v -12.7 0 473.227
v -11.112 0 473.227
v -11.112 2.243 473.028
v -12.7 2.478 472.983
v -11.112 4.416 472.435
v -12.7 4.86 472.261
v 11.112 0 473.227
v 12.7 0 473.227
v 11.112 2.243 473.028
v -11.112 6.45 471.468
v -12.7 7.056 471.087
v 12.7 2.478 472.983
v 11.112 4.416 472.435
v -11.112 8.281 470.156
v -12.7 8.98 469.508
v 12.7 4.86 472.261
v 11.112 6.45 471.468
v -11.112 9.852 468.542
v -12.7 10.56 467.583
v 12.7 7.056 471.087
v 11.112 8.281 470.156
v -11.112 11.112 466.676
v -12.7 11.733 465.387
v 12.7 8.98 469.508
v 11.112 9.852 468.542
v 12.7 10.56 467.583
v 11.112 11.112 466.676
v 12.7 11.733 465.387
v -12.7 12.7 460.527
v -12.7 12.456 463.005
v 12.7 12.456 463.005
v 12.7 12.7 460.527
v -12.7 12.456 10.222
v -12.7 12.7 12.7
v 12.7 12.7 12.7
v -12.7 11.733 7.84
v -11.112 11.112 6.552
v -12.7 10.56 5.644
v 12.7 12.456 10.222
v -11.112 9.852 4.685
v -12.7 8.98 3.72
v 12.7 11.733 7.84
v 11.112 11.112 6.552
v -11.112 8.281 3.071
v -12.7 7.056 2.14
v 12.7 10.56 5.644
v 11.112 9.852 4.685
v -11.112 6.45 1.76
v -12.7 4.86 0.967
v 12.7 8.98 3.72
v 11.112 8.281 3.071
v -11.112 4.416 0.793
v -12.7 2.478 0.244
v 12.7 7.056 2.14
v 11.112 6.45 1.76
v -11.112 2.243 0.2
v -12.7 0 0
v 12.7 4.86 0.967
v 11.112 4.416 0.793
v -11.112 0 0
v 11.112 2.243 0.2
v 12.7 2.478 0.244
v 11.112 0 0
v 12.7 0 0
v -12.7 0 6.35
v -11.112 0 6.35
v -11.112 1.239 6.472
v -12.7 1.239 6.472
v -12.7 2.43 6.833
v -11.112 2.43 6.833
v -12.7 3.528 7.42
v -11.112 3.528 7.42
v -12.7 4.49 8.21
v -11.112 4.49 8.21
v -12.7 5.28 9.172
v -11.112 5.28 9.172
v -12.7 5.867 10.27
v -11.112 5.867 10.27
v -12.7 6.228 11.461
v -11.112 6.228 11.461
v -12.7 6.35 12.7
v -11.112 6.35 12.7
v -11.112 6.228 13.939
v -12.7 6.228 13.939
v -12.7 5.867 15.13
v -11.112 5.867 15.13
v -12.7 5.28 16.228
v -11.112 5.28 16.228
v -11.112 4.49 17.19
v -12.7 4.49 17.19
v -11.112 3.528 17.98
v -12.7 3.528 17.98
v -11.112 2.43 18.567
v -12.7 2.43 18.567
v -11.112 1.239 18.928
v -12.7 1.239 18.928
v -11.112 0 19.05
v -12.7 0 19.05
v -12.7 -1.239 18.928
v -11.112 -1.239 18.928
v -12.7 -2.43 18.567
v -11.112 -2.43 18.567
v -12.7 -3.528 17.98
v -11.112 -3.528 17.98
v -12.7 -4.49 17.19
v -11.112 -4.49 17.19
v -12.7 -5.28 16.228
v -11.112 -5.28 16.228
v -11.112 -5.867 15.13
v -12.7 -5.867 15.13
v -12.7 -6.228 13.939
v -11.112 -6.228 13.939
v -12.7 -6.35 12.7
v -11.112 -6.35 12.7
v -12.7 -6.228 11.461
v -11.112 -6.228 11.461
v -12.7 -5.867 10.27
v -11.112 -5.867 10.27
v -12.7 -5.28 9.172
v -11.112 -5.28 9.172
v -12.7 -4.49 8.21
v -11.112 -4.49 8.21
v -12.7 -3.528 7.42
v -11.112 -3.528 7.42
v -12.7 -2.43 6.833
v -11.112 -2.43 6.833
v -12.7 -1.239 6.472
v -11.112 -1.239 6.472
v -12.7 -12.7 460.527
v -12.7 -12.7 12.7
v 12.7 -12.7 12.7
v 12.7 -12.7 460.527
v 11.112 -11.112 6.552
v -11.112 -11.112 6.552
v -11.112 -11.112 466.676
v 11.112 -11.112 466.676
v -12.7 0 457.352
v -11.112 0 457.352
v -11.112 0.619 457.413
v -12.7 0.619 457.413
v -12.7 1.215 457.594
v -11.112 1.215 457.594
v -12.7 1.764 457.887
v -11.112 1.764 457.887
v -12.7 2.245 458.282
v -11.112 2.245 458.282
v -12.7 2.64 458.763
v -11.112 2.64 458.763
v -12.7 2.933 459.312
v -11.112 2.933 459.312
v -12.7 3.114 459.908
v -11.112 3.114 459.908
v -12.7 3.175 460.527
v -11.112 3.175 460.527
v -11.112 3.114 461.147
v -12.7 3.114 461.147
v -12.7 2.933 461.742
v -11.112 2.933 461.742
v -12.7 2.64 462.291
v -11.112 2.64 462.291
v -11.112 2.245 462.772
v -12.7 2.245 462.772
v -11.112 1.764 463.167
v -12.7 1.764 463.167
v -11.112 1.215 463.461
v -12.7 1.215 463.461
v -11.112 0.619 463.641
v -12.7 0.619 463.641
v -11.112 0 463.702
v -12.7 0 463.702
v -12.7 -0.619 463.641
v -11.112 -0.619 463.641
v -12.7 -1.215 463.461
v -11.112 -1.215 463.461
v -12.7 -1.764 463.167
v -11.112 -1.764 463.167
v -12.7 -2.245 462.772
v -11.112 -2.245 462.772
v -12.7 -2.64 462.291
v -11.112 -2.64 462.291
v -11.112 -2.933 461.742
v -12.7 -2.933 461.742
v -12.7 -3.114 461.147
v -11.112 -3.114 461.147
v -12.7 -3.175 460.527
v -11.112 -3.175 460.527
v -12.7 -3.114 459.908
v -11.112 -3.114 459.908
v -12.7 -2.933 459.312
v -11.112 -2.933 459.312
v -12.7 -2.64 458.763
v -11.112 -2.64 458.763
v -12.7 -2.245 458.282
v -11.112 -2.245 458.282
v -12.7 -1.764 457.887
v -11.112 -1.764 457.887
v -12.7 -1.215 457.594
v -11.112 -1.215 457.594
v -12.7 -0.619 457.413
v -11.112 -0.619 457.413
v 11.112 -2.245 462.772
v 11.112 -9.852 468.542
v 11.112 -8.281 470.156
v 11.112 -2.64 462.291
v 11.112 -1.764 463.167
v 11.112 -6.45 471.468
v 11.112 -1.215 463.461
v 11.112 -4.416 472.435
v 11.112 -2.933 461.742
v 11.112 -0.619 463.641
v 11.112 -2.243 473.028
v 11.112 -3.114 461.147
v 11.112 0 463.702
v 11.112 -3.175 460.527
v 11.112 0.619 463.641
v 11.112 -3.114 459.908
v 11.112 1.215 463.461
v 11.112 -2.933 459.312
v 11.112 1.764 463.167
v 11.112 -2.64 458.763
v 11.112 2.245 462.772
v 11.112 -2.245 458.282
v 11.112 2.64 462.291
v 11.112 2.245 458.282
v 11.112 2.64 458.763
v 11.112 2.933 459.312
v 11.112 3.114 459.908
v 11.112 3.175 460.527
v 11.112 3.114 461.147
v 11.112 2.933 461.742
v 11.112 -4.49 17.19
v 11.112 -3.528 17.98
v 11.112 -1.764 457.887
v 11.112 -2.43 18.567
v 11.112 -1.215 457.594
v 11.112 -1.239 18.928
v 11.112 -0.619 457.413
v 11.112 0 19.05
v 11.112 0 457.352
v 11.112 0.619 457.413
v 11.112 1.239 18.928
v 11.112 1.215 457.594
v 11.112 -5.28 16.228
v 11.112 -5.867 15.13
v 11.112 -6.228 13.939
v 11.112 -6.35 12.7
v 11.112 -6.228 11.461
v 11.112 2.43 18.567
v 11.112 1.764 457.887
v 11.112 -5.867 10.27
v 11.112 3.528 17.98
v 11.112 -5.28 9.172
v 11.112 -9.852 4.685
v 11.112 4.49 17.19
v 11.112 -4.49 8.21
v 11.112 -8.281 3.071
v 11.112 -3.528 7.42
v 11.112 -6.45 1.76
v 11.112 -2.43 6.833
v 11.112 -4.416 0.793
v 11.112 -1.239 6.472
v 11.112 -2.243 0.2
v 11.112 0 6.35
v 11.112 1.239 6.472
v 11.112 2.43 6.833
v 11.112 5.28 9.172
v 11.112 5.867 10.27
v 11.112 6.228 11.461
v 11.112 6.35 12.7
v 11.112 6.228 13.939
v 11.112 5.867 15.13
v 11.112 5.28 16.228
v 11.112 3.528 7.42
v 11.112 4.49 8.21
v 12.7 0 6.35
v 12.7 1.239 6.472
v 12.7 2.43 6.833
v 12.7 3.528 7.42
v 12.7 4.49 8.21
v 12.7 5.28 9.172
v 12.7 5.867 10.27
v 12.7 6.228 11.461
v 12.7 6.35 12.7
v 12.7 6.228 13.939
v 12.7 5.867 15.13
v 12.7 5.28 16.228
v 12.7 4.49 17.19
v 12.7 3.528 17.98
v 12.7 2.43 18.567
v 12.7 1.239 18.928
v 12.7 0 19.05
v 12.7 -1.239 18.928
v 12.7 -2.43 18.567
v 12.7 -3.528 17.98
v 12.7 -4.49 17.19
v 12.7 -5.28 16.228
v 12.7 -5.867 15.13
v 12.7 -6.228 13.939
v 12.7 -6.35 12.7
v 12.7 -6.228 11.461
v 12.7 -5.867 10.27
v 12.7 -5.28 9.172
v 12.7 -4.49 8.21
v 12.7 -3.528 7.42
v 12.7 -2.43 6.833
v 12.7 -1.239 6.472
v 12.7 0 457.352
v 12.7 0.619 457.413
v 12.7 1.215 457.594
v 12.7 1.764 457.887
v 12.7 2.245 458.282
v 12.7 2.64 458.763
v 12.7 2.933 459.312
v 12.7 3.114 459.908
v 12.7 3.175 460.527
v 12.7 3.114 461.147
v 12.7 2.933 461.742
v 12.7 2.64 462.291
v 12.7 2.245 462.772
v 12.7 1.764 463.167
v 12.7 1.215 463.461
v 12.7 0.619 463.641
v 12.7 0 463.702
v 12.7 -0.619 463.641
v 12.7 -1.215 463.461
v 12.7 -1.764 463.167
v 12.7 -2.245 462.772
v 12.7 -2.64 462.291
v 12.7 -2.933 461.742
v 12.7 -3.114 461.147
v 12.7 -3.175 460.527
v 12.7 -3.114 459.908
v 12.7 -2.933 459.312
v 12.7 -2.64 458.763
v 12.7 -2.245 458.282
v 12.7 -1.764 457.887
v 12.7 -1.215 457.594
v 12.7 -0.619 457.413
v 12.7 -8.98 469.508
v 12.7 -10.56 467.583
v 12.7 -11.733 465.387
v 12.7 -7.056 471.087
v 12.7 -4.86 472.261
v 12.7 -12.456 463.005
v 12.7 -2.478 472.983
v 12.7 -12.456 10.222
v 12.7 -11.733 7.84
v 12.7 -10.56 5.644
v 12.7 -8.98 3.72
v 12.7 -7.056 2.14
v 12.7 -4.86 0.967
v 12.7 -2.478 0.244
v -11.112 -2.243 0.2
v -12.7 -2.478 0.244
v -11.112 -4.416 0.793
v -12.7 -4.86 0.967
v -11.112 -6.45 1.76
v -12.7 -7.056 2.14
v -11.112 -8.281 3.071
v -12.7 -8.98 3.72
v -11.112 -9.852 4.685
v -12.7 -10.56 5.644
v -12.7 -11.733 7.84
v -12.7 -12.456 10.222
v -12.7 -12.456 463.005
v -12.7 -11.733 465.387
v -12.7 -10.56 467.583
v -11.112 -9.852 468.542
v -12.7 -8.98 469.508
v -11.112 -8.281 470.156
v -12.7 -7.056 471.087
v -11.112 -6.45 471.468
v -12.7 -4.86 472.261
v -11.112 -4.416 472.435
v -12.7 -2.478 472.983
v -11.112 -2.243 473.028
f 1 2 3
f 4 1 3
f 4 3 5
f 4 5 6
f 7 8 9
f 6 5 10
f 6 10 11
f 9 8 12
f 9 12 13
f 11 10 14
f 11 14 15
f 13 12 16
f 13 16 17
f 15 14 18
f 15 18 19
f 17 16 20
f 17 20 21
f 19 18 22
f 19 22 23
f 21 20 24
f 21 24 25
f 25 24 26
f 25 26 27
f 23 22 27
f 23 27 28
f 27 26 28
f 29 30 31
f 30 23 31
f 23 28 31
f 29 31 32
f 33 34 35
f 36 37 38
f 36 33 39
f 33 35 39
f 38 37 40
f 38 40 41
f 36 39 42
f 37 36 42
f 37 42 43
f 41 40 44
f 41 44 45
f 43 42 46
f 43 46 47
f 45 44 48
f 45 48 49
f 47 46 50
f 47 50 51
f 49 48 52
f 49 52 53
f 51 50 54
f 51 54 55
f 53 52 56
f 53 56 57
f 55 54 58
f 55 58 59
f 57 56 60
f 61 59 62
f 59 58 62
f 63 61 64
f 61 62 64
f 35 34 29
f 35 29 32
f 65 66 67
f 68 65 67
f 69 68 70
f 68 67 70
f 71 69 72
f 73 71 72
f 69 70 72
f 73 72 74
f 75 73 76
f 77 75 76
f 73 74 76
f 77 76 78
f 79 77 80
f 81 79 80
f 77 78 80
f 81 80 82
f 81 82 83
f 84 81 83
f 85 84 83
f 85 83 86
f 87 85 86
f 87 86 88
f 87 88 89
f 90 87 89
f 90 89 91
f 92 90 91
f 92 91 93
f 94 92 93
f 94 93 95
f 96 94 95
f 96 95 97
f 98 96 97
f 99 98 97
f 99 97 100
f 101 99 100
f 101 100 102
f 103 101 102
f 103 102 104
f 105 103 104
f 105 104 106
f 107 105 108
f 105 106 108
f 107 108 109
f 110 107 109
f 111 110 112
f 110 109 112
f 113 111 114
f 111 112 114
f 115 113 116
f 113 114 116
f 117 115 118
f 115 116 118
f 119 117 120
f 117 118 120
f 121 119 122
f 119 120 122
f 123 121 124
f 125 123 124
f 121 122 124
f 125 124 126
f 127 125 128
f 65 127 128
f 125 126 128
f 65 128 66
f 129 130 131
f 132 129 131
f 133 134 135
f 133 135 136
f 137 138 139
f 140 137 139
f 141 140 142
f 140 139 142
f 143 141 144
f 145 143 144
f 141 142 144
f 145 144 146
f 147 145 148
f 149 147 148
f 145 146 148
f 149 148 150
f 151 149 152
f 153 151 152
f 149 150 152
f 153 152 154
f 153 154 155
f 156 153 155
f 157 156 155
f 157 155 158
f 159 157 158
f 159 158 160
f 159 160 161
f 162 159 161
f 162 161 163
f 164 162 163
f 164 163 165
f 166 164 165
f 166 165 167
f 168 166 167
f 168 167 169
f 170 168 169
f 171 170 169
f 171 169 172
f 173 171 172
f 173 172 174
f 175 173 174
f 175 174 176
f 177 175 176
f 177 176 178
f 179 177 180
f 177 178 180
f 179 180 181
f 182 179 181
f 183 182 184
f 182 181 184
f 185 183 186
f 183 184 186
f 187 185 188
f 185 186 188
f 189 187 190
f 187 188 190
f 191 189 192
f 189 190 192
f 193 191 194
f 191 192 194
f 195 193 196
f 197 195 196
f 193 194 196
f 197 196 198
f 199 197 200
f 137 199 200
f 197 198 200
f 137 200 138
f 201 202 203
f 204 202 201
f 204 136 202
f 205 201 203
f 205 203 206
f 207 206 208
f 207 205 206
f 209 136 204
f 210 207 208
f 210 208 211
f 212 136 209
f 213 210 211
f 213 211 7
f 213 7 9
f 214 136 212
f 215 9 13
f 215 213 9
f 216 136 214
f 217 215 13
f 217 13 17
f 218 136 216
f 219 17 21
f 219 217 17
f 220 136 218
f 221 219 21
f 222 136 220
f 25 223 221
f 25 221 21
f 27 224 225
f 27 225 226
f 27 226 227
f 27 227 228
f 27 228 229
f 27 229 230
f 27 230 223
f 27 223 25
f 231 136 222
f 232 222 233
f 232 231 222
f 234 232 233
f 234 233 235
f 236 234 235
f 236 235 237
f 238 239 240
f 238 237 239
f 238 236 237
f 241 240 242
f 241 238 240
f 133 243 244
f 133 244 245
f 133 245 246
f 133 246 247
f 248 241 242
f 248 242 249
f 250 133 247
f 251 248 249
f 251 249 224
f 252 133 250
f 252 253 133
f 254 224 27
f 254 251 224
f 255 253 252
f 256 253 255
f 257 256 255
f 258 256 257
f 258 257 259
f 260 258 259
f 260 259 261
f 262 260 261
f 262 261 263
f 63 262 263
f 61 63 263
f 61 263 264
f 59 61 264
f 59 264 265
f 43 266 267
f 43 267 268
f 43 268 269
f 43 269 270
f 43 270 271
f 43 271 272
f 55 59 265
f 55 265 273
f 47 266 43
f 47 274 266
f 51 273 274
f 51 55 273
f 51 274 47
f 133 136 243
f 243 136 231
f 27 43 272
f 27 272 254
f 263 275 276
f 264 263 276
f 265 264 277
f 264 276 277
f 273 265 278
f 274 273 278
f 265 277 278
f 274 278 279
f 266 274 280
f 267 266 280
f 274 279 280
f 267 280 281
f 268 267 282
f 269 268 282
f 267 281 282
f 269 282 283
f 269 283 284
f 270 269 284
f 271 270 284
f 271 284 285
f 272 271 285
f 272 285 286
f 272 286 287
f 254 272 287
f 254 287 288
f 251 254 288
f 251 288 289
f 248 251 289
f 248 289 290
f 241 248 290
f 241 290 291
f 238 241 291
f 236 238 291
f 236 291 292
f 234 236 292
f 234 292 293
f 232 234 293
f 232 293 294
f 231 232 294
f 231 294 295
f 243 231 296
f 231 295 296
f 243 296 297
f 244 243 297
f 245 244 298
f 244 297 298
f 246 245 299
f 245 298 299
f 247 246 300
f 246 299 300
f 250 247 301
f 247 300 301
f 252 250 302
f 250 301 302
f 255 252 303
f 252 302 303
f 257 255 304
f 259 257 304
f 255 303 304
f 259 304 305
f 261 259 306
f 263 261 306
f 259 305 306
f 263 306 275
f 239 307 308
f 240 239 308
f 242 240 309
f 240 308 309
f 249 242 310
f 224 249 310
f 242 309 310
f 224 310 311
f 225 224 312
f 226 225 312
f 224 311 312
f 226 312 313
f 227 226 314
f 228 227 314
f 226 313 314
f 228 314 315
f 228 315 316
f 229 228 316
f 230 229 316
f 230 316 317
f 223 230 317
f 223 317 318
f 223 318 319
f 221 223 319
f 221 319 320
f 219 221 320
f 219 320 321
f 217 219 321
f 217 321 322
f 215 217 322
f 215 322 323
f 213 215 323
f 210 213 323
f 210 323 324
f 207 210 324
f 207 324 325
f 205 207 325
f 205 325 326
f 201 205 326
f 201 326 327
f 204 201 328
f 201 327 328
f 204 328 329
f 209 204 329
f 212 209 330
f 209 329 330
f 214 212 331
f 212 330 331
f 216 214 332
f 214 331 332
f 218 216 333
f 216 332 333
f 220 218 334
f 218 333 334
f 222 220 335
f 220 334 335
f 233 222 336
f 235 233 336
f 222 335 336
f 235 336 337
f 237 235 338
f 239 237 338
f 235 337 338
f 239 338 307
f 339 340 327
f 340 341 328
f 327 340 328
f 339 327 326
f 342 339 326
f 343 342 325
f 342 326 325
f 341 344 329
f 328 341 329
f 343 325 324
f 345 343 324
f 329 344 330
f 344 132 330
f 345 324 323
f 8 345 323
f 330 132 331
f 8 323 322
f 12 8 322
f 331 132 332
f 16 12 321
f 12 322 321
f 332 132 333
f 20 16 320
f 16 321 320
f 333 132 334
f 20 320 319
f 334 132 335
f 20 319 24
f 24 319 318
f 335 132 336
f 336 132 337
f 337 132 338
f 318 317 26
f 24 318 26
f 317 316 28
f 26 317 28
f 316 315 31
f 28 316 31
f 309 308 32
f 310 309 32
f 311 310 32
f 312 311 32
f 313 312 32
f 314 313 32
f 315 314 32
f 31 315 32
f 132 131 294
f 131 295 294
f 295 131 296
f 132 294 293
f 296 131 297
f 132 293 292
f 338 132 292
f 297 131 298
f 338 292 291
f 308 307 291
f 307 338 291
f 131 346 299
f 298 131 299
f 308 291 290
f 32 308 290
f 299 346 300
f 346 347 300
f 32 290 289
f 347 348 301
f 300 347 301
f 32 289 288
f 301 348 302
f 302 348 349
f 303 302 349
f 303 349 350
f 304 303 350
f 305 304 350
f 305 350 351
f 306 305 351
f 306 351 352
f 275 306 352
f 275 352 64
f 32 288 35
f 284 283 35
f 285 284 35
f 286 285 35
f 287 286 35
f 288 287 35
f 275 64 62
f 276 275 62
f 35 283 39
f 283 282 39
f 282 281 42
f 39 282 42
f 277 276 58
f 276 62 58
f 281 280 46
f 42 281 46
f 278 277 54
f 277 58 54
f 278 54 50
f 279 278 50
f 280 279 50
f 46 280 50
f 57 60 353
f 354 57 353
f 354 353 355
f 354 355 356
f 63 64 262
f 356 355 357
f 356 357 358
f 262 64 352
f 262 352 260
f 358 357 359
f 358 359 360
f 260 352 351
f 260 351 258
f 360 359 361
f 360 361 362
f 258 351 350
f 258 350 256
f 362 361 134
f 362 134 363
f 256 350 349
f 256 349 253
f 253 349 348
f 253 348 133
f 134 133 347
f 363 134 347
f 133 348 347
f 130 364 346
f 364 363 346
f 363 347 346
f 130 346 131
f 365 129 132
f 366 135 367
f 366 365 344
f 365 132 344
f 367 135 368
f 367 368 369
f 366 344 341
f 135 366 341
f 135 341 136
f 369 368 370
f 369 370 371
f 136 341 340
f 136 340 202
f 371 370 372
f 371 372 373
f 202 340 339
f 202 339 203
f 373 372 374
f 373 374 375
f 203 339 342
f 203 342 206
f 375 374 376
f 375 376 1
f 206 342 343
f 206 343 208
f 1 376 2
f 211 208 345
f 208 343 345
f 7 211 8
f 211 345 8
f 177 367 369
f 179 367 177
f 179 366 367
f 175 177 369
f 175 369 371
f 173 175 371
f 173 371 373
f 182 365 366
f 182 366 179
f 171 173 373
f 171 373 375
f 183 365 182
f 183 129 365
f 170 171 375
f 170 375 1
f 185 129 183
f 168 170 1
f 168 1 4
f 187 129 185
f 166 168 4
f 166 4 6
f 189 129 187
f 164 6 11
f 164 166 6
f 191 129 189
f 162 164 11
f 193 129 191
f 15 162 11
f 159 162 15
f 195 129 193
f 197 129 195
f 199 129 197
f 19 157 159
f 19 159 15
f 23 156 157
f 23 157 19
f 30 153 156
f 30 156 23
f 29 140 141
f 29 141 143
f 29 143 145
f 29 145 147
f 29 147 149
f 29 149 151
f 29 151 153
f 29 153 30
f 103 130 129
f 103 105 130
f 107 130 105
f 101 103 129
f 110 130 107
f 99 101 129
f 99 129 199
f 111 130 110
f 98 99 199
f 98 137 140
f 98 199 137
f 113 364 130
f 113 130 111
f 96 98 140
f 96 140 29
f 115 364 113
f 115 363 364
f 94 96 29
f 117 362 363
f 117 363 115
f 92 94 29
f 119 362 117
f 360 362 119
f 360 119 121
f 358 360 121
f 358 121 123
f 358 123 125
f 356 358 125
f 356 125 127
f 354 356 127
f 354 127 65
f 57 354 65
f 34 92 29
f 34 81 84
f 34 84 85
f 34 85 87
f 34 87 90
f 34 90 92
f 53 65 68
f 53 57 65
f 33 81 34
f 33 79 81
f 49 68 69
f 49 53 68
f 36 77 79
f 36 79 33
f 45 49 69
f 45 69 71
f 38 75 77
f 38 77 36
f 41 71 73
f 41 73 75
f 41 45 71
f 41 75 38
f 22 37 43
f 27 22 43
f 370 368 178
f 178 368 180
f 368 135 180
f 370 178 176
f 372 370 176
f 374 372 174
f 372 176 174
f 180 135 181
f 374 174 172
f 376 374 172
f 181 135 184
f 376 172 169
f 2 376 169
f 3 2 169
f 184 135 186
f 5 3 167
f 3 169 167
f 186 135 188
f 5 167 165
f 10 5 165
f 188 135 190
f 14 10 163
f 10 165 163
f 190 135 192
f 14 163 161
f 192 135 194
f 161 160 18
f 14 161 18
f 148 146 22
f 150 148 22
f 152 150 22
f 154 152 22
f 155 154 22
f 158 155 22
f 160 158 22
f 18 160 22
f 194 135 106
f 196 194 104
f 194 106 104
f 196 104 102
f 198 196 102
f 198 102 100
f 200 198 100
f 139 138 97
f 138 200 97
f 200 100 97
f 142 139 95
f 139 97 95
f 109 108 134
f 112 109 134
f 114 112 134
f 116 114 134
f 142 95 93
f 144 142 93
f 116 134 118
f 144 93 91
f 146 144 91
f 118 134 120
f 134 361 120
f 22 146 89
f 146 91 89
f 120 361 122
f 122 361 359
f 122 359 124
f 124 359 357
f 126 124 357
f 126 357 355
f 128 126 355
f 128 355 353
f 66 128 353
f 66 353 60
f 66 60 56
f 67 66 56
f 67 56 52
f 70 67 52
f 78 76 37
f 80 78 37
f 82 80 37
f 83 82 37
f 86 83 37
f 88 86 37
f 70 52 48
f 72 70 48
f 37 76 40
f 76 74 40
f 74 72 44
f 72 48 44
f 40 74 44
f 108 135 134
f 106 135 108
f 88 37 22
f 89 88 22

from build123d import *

# Parameters (mm, degrees)
SKETCH1_W           = 25.4
SKETCH1_H           = 25.4
SKETCH1_W_2         = 22.225
SKETCH1_H_2         = 22.225
BOSS_EXTRUDE1_DEPTH = 473.2274
CUT_EXTRUDE1_DEPTH  = 26.4
SKETCH3_R           = 3.175
SKETCH3_R_2         = 6.35
CUT_EXTRUDE2_DEPTH  = 26.4
CUT_EXTRUDE3_DEPTH  = 26.4


with BuildPart() as part:
    # Sketch1 → Boss-Extrude1 (new body)
    with BuildSketch(Plane.XY):
        Rectangle(SKETCH1_W, SKETCH1_H)
        Rectangle(SKETCH1_W_2, SKETCH1_H_2, mode=Mode.SUBTRACT)
    extrude(amount=BOSS_EXTRUDE1_DEPTH)

    # Sketch2 → Cut-Extrude1 (cut, through all)
    with BuildSketch(Plane(origin=(12.7, 0, 0), x_dir=(0, 0, -1), z_dir=(1, 0, 0))):
        with BuildLine():
            Line((-460.5274, 12.7), (-473.2274, 12.7))
            Line((-473.2274, 12.7), (-473.2274, 9.7e-08))
            ThreePointArc((-473.2274, 9.7e-08), (-469.507656087, 8.980256155), (-460.5274, 12.7))
        make_face()
        with BuildLine():
            ThreePointArc((-460.5274, -12.7), (-469.507656155, -8.980256087), (-473.2274, 9.7e-08))
            Line((-473.2274, 9.7e-08), (-473.2274, -12.7))
            Line((-473.2274, -12.7), (-460.5274, -12.7))
        make_face()
    extrude(amount=-CUT_EXTRUDE1_DEPTH, mode=Mode.SUBTRACT)

    # Sketch3 → Cut-Extrude2 (cut, through all)
    with BuildSketch(Plane(origin=(12.7, 0, 0), x_dir=(0, 0, -1), z_dir=(1, 0, 0))):
        with Locations((-460.5274, 0)):
            Circle(SKETCH3_R)
        with Locations((-12.7, 0)):
            Circle(SKETCH3_R_2)
    extrude(amount=-CUT_EXTRUDE2_DEPTH, mode=Mode.SUBTRACT)

    # Sketch5 → Cut-Extrude3 (cut, through all)
    with BuildSketch(Plane(origin=(12.7, 0, 0), x_dir=(0, 0, -1), z_dir=(1, 0, 0))):
        with BuildLine():
            Line((0, 12.7), (-12.7, 12.7))
            ThreePointArc((-12.7, 12.7), (-3.719743879, 8.980256121), (0, 0))
            Line((0, 0), (0, 12.7))
        make_face()
        with BuildLine():
            Line((0, -12.7), (0, 0))
            ThreePointArc((0, 0), (-3.719743879, -8.980256121), (-12.7, -12.7))
            Line((-12.7, -12.7), (0, -12.7))
        make_face()
    extrude(amount=-CUT_EXTRUDE3_DEPTH, mode=Mode.SUBTRACT)


solid = part.part
